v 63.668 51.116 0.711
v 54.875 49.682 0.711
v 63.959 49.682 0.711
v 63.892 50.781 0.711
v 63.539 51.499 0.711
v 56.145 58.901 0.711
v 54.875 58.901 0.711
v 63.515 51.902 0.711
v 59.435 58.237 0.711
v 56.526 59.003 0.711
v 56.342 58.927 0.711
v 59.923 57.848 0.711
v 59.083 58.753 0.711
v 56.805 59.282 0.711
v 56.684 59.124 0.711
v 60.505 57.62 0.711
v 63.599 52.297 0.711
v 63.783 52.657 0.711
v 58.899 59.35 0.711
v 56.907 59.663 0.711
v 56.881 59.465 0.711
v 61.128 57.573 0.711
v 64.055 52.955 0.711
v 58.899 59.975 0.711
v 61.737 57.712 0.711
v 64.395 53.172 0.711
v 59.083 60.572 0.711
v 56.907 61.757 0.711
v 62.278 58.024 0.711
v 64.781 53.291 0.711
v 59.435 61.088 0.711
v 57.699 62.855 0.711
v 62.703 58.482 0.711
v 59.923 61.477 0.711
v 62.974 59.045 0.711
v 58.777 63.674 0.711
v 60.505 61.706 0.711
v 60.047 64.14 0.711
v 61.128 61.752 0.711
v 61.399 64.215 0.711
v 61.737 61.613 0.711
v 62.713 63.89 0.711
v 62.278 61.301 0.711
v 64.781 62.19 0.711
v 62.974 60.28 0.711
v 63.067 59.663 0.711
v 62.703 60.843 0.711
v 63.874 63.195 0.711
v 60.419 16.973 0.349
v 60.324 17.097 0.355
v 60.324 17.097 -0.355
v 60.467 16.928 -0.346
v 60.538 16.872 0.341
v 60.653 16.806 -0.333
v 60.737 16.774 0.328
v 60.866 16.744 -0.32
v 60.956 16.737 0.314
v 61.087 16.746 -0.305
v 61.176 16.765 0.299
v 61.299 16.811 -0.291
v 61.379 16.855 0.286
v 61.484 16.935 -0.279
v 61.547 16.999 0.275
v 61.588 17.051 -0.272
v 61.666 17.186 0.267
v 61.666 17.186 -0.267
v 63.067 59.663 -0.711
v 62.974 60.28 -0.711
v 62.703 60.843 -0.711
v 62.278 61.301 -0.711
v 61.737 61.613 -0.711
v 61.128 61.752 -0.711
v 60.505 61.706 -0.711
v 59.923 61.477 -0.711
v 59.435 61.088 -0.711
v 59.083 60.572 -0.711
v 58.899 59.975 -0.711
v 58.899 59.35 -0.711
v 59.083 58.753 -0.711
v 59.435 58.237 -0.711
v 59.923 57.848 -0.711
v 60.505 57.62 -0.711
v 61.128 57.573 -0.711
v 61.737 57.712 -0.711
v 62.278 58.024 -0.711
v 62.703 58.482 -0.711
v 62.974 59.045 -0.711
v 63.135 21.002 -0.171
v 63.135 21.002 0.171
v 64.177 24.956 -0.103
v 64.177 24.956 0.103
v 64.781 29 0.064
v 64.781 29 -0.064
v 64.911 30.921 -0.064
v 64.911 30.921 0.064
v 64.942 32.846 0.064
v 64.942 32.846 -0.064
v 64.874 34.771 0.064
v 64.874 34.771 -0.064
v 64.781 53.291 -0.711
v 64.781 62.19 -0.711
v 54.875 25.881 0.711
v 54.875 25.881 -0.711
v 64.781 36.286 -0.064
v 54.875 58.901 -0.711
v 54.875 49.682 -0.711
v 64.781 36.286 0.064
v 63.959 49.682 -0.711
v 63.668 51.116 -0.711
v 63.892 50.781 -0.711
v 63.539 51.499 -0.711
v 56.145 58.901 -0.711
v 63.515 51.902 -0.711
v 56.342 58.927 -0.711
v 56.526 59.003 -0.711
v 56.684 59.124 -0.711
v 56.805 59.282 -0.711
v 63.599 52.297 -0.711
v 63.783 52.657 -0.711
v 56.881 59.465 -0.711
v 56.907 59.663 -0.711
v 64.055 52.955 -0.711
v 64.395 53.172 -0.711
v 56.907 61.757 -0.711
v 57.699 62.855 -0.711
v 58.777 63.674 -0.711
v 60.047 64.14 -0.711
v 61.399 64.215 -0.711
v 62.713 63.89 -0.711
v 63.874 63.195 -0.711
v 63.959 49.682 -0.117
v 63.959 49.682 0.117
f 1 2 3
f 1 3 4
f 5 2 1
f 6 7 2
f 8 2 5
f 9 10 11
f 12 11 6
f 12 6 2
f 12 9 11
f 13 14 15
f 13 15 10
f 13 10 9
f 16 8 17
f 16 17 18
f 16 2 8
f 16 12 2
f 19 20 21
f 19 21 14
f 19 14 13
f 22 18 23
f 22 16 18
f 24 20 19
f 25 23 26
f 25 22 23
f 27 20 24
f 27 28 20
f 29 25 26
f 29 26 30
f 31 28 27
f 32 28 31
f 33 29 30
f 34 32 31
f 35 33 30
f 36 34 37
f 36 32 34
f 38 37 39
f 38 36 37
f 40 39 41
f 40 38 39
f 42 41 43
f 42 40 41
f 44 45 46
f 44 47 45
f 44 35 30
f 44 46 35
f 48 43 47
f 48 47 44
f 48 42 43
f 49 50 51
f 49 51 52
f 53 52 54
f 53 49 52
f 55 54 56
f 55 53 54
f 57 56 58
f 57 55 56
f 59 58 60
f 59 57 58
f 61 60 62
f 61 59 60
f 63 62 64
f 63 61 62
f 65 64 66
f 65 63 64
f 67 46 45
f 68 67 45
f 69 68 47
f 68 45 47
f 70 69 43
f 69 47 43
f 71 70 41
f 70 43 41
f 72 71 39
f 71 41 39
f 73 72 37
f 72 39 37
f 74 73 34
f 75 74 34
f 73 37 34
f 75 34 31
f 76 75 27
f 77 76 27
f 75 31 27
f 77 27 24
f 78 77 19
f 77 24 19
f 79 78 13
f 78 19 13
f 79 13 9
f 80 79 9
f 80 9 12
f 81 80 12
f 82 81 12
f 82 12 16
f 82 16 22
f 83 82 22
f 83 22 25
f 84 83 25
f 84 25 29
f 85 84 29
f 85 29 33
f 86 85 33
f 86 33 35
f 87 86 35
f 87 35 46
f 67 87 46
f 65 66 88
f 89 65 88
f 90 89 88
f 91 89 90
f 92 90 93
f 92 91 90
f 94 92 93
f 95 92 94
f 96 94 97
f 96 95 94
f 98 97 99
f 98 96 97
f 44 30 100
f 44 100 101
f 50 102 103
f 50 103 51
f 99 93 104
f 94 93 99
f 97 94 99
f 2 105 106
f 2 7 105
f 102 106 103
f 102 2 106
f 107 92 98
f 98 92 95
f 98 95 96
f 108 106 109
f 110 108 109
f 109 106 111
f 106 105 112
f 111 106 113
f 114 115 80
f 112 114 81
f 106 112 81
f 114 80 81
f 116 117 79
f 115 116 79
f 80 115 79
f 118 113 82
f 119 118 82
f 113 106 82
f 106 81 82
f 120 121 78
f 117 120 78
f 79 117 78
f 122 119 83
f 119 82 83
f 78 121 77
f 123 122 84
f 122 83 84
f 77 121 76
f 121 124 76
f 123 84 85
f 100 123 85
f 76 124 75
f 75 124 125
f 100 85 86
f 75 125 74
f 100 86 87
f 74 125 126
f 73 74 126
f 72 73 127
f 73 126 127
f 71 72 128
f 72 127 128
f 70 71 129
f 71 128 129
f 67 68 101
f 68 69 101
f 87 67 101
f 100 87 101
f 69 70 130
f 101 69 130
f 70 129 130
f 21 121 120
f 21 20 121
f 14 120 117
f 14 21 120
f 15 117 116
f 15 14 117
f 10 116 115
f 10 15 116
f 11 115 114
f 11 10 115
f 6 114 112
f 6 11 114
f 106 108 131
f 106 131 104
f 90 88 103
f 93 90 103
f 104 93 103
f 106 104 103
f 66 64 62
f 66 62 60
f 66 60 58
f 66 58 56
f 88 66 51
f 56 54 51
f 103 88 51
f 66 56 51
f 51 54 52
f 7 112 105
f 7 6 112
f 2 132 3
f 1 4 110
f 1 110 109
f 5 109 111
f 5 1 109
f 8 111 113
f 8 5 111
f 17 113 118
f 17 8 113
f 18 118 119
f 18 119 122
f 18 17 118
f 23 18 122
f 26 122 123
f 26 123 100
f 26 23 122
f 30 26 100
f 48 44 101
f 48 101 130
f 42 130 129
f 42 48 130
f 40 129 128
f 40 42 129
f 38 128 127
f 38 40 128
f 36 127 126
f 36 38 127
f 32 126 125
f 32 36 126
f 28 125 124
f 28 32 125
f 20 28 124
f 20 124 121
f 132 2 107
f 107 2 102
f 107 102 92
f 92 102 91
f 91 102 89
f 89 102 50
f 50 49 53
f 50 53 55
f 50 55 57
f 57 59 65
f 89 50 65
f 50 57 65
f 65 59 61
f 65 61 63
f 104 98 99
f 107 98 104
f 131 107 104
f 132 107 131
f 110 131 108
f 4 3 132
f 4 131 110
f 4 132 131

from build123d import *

# Parameters (mm, degrees)
BOSS_EXTRUDE1_DEPTH = 0.7112
SKETCH2_R           = 2.0955
CUT_EXTRUDE1_DEPTH  = 2.4224
CUT_EXTRUDE2_DEPTH  = 49.6824
SKETCH4_W           = 0.6477
SKETCH4_H           = 7.286325031
CUT_EXTRUDE4_DEPTH  = 25.4


with BuildPart() as part:
    # Sketch1 → Boss-Extrude1 (new body, symmetric)
    with BuildSketch(Plane.XY):
        with BuildLine():
            Line((54.87519109, 58.900672801), (54.87519109, 25.880672801))
            Line((54.87519109, 25.880672801), (60.323650659, 17.097007032))
            ThreePointArc((60.323650659, 17.097007032), (61.02184914, 16.738358549), (61.666295368, 17.186464467))
            ThreePointArc((61.666295368, 17.186464467), (64.337974251, 25.783780398), (64.874140477, 34.770672801))
            Line((64.874140477, 34.770672801), (63.892088906, 50.780757429))
            ThreePointArc((63.892088906, 50.780757429), (63.598614861, 52.297421008), (64.78119109, 53.291357066))
            Line((64.78119109, 53.291357066), (64.78119109, 62.189940891))
            ThreePointArc((64.78119109, 62.189940891), (60.720306841, 64.227784091), (56.90719109, 61.757210459))
            Line((56.90719109, 61.757210459), (56.90719109, 59.662672801))
            ThreePointArc((56.90719109, 59.662672801), (56.684006458, 59.123857434), (56.14519109, 58.900672801))
            Line((56.14519109, 58.900672801), (54.87519109, 58.900672801))
        make_face()
    extrude(amount=BOSS_EXTRUDE1_DEPTH, both=True)

    # Sketch2 → Cut-Extrude1 (cut, through all)
    with BuildSketch(Plane.XY.offset(0.7112)):
        with Locations((60.97119109, 59.662672801)):
            Circle(SKETCH2_R)
    extrude(amount=-CUT_EXTRUDE1_DEPTH, mode=Mode.SUBTRACT)

    # Sketch3 → Cut-Extrude2 (cut)
    with BuildSketch(Plane(origin=(0, 0, 0), x_dir=(1, 0, 0), z_dir=(0, 1, 0))):
        Polygon((64.78119109, 0.0635), (54.87519109, 0.7112), (64.78119109, 0.7112), align=None)
        Polygon((54.87519109, -0.7112), (64.78119109, -0.0635), (64.78119109, -0.7112), align=None)
    extrude(amount=CUT_EXTRUDE2_DEPTH, mode=Mode.SUBTRACT)

    # Sketch4 → Cut-Extrude4 (cut)
    with BuildSketch(Plane.ZY.offset(-64.78119109)):
        with Locations((0.38735, 32.642835537)):
            Rectangle(SKETCH4_W, SKETCH4_H)
        with Locations((-0.38735, 32.642835537)):
            Rectangle(SKETCH4_W, SKETCH4_H)
    extrude(amount=-CUT_EXTRUDE4_DEPTH, mode=Mode.SUBTRACT)


solid = part.part
